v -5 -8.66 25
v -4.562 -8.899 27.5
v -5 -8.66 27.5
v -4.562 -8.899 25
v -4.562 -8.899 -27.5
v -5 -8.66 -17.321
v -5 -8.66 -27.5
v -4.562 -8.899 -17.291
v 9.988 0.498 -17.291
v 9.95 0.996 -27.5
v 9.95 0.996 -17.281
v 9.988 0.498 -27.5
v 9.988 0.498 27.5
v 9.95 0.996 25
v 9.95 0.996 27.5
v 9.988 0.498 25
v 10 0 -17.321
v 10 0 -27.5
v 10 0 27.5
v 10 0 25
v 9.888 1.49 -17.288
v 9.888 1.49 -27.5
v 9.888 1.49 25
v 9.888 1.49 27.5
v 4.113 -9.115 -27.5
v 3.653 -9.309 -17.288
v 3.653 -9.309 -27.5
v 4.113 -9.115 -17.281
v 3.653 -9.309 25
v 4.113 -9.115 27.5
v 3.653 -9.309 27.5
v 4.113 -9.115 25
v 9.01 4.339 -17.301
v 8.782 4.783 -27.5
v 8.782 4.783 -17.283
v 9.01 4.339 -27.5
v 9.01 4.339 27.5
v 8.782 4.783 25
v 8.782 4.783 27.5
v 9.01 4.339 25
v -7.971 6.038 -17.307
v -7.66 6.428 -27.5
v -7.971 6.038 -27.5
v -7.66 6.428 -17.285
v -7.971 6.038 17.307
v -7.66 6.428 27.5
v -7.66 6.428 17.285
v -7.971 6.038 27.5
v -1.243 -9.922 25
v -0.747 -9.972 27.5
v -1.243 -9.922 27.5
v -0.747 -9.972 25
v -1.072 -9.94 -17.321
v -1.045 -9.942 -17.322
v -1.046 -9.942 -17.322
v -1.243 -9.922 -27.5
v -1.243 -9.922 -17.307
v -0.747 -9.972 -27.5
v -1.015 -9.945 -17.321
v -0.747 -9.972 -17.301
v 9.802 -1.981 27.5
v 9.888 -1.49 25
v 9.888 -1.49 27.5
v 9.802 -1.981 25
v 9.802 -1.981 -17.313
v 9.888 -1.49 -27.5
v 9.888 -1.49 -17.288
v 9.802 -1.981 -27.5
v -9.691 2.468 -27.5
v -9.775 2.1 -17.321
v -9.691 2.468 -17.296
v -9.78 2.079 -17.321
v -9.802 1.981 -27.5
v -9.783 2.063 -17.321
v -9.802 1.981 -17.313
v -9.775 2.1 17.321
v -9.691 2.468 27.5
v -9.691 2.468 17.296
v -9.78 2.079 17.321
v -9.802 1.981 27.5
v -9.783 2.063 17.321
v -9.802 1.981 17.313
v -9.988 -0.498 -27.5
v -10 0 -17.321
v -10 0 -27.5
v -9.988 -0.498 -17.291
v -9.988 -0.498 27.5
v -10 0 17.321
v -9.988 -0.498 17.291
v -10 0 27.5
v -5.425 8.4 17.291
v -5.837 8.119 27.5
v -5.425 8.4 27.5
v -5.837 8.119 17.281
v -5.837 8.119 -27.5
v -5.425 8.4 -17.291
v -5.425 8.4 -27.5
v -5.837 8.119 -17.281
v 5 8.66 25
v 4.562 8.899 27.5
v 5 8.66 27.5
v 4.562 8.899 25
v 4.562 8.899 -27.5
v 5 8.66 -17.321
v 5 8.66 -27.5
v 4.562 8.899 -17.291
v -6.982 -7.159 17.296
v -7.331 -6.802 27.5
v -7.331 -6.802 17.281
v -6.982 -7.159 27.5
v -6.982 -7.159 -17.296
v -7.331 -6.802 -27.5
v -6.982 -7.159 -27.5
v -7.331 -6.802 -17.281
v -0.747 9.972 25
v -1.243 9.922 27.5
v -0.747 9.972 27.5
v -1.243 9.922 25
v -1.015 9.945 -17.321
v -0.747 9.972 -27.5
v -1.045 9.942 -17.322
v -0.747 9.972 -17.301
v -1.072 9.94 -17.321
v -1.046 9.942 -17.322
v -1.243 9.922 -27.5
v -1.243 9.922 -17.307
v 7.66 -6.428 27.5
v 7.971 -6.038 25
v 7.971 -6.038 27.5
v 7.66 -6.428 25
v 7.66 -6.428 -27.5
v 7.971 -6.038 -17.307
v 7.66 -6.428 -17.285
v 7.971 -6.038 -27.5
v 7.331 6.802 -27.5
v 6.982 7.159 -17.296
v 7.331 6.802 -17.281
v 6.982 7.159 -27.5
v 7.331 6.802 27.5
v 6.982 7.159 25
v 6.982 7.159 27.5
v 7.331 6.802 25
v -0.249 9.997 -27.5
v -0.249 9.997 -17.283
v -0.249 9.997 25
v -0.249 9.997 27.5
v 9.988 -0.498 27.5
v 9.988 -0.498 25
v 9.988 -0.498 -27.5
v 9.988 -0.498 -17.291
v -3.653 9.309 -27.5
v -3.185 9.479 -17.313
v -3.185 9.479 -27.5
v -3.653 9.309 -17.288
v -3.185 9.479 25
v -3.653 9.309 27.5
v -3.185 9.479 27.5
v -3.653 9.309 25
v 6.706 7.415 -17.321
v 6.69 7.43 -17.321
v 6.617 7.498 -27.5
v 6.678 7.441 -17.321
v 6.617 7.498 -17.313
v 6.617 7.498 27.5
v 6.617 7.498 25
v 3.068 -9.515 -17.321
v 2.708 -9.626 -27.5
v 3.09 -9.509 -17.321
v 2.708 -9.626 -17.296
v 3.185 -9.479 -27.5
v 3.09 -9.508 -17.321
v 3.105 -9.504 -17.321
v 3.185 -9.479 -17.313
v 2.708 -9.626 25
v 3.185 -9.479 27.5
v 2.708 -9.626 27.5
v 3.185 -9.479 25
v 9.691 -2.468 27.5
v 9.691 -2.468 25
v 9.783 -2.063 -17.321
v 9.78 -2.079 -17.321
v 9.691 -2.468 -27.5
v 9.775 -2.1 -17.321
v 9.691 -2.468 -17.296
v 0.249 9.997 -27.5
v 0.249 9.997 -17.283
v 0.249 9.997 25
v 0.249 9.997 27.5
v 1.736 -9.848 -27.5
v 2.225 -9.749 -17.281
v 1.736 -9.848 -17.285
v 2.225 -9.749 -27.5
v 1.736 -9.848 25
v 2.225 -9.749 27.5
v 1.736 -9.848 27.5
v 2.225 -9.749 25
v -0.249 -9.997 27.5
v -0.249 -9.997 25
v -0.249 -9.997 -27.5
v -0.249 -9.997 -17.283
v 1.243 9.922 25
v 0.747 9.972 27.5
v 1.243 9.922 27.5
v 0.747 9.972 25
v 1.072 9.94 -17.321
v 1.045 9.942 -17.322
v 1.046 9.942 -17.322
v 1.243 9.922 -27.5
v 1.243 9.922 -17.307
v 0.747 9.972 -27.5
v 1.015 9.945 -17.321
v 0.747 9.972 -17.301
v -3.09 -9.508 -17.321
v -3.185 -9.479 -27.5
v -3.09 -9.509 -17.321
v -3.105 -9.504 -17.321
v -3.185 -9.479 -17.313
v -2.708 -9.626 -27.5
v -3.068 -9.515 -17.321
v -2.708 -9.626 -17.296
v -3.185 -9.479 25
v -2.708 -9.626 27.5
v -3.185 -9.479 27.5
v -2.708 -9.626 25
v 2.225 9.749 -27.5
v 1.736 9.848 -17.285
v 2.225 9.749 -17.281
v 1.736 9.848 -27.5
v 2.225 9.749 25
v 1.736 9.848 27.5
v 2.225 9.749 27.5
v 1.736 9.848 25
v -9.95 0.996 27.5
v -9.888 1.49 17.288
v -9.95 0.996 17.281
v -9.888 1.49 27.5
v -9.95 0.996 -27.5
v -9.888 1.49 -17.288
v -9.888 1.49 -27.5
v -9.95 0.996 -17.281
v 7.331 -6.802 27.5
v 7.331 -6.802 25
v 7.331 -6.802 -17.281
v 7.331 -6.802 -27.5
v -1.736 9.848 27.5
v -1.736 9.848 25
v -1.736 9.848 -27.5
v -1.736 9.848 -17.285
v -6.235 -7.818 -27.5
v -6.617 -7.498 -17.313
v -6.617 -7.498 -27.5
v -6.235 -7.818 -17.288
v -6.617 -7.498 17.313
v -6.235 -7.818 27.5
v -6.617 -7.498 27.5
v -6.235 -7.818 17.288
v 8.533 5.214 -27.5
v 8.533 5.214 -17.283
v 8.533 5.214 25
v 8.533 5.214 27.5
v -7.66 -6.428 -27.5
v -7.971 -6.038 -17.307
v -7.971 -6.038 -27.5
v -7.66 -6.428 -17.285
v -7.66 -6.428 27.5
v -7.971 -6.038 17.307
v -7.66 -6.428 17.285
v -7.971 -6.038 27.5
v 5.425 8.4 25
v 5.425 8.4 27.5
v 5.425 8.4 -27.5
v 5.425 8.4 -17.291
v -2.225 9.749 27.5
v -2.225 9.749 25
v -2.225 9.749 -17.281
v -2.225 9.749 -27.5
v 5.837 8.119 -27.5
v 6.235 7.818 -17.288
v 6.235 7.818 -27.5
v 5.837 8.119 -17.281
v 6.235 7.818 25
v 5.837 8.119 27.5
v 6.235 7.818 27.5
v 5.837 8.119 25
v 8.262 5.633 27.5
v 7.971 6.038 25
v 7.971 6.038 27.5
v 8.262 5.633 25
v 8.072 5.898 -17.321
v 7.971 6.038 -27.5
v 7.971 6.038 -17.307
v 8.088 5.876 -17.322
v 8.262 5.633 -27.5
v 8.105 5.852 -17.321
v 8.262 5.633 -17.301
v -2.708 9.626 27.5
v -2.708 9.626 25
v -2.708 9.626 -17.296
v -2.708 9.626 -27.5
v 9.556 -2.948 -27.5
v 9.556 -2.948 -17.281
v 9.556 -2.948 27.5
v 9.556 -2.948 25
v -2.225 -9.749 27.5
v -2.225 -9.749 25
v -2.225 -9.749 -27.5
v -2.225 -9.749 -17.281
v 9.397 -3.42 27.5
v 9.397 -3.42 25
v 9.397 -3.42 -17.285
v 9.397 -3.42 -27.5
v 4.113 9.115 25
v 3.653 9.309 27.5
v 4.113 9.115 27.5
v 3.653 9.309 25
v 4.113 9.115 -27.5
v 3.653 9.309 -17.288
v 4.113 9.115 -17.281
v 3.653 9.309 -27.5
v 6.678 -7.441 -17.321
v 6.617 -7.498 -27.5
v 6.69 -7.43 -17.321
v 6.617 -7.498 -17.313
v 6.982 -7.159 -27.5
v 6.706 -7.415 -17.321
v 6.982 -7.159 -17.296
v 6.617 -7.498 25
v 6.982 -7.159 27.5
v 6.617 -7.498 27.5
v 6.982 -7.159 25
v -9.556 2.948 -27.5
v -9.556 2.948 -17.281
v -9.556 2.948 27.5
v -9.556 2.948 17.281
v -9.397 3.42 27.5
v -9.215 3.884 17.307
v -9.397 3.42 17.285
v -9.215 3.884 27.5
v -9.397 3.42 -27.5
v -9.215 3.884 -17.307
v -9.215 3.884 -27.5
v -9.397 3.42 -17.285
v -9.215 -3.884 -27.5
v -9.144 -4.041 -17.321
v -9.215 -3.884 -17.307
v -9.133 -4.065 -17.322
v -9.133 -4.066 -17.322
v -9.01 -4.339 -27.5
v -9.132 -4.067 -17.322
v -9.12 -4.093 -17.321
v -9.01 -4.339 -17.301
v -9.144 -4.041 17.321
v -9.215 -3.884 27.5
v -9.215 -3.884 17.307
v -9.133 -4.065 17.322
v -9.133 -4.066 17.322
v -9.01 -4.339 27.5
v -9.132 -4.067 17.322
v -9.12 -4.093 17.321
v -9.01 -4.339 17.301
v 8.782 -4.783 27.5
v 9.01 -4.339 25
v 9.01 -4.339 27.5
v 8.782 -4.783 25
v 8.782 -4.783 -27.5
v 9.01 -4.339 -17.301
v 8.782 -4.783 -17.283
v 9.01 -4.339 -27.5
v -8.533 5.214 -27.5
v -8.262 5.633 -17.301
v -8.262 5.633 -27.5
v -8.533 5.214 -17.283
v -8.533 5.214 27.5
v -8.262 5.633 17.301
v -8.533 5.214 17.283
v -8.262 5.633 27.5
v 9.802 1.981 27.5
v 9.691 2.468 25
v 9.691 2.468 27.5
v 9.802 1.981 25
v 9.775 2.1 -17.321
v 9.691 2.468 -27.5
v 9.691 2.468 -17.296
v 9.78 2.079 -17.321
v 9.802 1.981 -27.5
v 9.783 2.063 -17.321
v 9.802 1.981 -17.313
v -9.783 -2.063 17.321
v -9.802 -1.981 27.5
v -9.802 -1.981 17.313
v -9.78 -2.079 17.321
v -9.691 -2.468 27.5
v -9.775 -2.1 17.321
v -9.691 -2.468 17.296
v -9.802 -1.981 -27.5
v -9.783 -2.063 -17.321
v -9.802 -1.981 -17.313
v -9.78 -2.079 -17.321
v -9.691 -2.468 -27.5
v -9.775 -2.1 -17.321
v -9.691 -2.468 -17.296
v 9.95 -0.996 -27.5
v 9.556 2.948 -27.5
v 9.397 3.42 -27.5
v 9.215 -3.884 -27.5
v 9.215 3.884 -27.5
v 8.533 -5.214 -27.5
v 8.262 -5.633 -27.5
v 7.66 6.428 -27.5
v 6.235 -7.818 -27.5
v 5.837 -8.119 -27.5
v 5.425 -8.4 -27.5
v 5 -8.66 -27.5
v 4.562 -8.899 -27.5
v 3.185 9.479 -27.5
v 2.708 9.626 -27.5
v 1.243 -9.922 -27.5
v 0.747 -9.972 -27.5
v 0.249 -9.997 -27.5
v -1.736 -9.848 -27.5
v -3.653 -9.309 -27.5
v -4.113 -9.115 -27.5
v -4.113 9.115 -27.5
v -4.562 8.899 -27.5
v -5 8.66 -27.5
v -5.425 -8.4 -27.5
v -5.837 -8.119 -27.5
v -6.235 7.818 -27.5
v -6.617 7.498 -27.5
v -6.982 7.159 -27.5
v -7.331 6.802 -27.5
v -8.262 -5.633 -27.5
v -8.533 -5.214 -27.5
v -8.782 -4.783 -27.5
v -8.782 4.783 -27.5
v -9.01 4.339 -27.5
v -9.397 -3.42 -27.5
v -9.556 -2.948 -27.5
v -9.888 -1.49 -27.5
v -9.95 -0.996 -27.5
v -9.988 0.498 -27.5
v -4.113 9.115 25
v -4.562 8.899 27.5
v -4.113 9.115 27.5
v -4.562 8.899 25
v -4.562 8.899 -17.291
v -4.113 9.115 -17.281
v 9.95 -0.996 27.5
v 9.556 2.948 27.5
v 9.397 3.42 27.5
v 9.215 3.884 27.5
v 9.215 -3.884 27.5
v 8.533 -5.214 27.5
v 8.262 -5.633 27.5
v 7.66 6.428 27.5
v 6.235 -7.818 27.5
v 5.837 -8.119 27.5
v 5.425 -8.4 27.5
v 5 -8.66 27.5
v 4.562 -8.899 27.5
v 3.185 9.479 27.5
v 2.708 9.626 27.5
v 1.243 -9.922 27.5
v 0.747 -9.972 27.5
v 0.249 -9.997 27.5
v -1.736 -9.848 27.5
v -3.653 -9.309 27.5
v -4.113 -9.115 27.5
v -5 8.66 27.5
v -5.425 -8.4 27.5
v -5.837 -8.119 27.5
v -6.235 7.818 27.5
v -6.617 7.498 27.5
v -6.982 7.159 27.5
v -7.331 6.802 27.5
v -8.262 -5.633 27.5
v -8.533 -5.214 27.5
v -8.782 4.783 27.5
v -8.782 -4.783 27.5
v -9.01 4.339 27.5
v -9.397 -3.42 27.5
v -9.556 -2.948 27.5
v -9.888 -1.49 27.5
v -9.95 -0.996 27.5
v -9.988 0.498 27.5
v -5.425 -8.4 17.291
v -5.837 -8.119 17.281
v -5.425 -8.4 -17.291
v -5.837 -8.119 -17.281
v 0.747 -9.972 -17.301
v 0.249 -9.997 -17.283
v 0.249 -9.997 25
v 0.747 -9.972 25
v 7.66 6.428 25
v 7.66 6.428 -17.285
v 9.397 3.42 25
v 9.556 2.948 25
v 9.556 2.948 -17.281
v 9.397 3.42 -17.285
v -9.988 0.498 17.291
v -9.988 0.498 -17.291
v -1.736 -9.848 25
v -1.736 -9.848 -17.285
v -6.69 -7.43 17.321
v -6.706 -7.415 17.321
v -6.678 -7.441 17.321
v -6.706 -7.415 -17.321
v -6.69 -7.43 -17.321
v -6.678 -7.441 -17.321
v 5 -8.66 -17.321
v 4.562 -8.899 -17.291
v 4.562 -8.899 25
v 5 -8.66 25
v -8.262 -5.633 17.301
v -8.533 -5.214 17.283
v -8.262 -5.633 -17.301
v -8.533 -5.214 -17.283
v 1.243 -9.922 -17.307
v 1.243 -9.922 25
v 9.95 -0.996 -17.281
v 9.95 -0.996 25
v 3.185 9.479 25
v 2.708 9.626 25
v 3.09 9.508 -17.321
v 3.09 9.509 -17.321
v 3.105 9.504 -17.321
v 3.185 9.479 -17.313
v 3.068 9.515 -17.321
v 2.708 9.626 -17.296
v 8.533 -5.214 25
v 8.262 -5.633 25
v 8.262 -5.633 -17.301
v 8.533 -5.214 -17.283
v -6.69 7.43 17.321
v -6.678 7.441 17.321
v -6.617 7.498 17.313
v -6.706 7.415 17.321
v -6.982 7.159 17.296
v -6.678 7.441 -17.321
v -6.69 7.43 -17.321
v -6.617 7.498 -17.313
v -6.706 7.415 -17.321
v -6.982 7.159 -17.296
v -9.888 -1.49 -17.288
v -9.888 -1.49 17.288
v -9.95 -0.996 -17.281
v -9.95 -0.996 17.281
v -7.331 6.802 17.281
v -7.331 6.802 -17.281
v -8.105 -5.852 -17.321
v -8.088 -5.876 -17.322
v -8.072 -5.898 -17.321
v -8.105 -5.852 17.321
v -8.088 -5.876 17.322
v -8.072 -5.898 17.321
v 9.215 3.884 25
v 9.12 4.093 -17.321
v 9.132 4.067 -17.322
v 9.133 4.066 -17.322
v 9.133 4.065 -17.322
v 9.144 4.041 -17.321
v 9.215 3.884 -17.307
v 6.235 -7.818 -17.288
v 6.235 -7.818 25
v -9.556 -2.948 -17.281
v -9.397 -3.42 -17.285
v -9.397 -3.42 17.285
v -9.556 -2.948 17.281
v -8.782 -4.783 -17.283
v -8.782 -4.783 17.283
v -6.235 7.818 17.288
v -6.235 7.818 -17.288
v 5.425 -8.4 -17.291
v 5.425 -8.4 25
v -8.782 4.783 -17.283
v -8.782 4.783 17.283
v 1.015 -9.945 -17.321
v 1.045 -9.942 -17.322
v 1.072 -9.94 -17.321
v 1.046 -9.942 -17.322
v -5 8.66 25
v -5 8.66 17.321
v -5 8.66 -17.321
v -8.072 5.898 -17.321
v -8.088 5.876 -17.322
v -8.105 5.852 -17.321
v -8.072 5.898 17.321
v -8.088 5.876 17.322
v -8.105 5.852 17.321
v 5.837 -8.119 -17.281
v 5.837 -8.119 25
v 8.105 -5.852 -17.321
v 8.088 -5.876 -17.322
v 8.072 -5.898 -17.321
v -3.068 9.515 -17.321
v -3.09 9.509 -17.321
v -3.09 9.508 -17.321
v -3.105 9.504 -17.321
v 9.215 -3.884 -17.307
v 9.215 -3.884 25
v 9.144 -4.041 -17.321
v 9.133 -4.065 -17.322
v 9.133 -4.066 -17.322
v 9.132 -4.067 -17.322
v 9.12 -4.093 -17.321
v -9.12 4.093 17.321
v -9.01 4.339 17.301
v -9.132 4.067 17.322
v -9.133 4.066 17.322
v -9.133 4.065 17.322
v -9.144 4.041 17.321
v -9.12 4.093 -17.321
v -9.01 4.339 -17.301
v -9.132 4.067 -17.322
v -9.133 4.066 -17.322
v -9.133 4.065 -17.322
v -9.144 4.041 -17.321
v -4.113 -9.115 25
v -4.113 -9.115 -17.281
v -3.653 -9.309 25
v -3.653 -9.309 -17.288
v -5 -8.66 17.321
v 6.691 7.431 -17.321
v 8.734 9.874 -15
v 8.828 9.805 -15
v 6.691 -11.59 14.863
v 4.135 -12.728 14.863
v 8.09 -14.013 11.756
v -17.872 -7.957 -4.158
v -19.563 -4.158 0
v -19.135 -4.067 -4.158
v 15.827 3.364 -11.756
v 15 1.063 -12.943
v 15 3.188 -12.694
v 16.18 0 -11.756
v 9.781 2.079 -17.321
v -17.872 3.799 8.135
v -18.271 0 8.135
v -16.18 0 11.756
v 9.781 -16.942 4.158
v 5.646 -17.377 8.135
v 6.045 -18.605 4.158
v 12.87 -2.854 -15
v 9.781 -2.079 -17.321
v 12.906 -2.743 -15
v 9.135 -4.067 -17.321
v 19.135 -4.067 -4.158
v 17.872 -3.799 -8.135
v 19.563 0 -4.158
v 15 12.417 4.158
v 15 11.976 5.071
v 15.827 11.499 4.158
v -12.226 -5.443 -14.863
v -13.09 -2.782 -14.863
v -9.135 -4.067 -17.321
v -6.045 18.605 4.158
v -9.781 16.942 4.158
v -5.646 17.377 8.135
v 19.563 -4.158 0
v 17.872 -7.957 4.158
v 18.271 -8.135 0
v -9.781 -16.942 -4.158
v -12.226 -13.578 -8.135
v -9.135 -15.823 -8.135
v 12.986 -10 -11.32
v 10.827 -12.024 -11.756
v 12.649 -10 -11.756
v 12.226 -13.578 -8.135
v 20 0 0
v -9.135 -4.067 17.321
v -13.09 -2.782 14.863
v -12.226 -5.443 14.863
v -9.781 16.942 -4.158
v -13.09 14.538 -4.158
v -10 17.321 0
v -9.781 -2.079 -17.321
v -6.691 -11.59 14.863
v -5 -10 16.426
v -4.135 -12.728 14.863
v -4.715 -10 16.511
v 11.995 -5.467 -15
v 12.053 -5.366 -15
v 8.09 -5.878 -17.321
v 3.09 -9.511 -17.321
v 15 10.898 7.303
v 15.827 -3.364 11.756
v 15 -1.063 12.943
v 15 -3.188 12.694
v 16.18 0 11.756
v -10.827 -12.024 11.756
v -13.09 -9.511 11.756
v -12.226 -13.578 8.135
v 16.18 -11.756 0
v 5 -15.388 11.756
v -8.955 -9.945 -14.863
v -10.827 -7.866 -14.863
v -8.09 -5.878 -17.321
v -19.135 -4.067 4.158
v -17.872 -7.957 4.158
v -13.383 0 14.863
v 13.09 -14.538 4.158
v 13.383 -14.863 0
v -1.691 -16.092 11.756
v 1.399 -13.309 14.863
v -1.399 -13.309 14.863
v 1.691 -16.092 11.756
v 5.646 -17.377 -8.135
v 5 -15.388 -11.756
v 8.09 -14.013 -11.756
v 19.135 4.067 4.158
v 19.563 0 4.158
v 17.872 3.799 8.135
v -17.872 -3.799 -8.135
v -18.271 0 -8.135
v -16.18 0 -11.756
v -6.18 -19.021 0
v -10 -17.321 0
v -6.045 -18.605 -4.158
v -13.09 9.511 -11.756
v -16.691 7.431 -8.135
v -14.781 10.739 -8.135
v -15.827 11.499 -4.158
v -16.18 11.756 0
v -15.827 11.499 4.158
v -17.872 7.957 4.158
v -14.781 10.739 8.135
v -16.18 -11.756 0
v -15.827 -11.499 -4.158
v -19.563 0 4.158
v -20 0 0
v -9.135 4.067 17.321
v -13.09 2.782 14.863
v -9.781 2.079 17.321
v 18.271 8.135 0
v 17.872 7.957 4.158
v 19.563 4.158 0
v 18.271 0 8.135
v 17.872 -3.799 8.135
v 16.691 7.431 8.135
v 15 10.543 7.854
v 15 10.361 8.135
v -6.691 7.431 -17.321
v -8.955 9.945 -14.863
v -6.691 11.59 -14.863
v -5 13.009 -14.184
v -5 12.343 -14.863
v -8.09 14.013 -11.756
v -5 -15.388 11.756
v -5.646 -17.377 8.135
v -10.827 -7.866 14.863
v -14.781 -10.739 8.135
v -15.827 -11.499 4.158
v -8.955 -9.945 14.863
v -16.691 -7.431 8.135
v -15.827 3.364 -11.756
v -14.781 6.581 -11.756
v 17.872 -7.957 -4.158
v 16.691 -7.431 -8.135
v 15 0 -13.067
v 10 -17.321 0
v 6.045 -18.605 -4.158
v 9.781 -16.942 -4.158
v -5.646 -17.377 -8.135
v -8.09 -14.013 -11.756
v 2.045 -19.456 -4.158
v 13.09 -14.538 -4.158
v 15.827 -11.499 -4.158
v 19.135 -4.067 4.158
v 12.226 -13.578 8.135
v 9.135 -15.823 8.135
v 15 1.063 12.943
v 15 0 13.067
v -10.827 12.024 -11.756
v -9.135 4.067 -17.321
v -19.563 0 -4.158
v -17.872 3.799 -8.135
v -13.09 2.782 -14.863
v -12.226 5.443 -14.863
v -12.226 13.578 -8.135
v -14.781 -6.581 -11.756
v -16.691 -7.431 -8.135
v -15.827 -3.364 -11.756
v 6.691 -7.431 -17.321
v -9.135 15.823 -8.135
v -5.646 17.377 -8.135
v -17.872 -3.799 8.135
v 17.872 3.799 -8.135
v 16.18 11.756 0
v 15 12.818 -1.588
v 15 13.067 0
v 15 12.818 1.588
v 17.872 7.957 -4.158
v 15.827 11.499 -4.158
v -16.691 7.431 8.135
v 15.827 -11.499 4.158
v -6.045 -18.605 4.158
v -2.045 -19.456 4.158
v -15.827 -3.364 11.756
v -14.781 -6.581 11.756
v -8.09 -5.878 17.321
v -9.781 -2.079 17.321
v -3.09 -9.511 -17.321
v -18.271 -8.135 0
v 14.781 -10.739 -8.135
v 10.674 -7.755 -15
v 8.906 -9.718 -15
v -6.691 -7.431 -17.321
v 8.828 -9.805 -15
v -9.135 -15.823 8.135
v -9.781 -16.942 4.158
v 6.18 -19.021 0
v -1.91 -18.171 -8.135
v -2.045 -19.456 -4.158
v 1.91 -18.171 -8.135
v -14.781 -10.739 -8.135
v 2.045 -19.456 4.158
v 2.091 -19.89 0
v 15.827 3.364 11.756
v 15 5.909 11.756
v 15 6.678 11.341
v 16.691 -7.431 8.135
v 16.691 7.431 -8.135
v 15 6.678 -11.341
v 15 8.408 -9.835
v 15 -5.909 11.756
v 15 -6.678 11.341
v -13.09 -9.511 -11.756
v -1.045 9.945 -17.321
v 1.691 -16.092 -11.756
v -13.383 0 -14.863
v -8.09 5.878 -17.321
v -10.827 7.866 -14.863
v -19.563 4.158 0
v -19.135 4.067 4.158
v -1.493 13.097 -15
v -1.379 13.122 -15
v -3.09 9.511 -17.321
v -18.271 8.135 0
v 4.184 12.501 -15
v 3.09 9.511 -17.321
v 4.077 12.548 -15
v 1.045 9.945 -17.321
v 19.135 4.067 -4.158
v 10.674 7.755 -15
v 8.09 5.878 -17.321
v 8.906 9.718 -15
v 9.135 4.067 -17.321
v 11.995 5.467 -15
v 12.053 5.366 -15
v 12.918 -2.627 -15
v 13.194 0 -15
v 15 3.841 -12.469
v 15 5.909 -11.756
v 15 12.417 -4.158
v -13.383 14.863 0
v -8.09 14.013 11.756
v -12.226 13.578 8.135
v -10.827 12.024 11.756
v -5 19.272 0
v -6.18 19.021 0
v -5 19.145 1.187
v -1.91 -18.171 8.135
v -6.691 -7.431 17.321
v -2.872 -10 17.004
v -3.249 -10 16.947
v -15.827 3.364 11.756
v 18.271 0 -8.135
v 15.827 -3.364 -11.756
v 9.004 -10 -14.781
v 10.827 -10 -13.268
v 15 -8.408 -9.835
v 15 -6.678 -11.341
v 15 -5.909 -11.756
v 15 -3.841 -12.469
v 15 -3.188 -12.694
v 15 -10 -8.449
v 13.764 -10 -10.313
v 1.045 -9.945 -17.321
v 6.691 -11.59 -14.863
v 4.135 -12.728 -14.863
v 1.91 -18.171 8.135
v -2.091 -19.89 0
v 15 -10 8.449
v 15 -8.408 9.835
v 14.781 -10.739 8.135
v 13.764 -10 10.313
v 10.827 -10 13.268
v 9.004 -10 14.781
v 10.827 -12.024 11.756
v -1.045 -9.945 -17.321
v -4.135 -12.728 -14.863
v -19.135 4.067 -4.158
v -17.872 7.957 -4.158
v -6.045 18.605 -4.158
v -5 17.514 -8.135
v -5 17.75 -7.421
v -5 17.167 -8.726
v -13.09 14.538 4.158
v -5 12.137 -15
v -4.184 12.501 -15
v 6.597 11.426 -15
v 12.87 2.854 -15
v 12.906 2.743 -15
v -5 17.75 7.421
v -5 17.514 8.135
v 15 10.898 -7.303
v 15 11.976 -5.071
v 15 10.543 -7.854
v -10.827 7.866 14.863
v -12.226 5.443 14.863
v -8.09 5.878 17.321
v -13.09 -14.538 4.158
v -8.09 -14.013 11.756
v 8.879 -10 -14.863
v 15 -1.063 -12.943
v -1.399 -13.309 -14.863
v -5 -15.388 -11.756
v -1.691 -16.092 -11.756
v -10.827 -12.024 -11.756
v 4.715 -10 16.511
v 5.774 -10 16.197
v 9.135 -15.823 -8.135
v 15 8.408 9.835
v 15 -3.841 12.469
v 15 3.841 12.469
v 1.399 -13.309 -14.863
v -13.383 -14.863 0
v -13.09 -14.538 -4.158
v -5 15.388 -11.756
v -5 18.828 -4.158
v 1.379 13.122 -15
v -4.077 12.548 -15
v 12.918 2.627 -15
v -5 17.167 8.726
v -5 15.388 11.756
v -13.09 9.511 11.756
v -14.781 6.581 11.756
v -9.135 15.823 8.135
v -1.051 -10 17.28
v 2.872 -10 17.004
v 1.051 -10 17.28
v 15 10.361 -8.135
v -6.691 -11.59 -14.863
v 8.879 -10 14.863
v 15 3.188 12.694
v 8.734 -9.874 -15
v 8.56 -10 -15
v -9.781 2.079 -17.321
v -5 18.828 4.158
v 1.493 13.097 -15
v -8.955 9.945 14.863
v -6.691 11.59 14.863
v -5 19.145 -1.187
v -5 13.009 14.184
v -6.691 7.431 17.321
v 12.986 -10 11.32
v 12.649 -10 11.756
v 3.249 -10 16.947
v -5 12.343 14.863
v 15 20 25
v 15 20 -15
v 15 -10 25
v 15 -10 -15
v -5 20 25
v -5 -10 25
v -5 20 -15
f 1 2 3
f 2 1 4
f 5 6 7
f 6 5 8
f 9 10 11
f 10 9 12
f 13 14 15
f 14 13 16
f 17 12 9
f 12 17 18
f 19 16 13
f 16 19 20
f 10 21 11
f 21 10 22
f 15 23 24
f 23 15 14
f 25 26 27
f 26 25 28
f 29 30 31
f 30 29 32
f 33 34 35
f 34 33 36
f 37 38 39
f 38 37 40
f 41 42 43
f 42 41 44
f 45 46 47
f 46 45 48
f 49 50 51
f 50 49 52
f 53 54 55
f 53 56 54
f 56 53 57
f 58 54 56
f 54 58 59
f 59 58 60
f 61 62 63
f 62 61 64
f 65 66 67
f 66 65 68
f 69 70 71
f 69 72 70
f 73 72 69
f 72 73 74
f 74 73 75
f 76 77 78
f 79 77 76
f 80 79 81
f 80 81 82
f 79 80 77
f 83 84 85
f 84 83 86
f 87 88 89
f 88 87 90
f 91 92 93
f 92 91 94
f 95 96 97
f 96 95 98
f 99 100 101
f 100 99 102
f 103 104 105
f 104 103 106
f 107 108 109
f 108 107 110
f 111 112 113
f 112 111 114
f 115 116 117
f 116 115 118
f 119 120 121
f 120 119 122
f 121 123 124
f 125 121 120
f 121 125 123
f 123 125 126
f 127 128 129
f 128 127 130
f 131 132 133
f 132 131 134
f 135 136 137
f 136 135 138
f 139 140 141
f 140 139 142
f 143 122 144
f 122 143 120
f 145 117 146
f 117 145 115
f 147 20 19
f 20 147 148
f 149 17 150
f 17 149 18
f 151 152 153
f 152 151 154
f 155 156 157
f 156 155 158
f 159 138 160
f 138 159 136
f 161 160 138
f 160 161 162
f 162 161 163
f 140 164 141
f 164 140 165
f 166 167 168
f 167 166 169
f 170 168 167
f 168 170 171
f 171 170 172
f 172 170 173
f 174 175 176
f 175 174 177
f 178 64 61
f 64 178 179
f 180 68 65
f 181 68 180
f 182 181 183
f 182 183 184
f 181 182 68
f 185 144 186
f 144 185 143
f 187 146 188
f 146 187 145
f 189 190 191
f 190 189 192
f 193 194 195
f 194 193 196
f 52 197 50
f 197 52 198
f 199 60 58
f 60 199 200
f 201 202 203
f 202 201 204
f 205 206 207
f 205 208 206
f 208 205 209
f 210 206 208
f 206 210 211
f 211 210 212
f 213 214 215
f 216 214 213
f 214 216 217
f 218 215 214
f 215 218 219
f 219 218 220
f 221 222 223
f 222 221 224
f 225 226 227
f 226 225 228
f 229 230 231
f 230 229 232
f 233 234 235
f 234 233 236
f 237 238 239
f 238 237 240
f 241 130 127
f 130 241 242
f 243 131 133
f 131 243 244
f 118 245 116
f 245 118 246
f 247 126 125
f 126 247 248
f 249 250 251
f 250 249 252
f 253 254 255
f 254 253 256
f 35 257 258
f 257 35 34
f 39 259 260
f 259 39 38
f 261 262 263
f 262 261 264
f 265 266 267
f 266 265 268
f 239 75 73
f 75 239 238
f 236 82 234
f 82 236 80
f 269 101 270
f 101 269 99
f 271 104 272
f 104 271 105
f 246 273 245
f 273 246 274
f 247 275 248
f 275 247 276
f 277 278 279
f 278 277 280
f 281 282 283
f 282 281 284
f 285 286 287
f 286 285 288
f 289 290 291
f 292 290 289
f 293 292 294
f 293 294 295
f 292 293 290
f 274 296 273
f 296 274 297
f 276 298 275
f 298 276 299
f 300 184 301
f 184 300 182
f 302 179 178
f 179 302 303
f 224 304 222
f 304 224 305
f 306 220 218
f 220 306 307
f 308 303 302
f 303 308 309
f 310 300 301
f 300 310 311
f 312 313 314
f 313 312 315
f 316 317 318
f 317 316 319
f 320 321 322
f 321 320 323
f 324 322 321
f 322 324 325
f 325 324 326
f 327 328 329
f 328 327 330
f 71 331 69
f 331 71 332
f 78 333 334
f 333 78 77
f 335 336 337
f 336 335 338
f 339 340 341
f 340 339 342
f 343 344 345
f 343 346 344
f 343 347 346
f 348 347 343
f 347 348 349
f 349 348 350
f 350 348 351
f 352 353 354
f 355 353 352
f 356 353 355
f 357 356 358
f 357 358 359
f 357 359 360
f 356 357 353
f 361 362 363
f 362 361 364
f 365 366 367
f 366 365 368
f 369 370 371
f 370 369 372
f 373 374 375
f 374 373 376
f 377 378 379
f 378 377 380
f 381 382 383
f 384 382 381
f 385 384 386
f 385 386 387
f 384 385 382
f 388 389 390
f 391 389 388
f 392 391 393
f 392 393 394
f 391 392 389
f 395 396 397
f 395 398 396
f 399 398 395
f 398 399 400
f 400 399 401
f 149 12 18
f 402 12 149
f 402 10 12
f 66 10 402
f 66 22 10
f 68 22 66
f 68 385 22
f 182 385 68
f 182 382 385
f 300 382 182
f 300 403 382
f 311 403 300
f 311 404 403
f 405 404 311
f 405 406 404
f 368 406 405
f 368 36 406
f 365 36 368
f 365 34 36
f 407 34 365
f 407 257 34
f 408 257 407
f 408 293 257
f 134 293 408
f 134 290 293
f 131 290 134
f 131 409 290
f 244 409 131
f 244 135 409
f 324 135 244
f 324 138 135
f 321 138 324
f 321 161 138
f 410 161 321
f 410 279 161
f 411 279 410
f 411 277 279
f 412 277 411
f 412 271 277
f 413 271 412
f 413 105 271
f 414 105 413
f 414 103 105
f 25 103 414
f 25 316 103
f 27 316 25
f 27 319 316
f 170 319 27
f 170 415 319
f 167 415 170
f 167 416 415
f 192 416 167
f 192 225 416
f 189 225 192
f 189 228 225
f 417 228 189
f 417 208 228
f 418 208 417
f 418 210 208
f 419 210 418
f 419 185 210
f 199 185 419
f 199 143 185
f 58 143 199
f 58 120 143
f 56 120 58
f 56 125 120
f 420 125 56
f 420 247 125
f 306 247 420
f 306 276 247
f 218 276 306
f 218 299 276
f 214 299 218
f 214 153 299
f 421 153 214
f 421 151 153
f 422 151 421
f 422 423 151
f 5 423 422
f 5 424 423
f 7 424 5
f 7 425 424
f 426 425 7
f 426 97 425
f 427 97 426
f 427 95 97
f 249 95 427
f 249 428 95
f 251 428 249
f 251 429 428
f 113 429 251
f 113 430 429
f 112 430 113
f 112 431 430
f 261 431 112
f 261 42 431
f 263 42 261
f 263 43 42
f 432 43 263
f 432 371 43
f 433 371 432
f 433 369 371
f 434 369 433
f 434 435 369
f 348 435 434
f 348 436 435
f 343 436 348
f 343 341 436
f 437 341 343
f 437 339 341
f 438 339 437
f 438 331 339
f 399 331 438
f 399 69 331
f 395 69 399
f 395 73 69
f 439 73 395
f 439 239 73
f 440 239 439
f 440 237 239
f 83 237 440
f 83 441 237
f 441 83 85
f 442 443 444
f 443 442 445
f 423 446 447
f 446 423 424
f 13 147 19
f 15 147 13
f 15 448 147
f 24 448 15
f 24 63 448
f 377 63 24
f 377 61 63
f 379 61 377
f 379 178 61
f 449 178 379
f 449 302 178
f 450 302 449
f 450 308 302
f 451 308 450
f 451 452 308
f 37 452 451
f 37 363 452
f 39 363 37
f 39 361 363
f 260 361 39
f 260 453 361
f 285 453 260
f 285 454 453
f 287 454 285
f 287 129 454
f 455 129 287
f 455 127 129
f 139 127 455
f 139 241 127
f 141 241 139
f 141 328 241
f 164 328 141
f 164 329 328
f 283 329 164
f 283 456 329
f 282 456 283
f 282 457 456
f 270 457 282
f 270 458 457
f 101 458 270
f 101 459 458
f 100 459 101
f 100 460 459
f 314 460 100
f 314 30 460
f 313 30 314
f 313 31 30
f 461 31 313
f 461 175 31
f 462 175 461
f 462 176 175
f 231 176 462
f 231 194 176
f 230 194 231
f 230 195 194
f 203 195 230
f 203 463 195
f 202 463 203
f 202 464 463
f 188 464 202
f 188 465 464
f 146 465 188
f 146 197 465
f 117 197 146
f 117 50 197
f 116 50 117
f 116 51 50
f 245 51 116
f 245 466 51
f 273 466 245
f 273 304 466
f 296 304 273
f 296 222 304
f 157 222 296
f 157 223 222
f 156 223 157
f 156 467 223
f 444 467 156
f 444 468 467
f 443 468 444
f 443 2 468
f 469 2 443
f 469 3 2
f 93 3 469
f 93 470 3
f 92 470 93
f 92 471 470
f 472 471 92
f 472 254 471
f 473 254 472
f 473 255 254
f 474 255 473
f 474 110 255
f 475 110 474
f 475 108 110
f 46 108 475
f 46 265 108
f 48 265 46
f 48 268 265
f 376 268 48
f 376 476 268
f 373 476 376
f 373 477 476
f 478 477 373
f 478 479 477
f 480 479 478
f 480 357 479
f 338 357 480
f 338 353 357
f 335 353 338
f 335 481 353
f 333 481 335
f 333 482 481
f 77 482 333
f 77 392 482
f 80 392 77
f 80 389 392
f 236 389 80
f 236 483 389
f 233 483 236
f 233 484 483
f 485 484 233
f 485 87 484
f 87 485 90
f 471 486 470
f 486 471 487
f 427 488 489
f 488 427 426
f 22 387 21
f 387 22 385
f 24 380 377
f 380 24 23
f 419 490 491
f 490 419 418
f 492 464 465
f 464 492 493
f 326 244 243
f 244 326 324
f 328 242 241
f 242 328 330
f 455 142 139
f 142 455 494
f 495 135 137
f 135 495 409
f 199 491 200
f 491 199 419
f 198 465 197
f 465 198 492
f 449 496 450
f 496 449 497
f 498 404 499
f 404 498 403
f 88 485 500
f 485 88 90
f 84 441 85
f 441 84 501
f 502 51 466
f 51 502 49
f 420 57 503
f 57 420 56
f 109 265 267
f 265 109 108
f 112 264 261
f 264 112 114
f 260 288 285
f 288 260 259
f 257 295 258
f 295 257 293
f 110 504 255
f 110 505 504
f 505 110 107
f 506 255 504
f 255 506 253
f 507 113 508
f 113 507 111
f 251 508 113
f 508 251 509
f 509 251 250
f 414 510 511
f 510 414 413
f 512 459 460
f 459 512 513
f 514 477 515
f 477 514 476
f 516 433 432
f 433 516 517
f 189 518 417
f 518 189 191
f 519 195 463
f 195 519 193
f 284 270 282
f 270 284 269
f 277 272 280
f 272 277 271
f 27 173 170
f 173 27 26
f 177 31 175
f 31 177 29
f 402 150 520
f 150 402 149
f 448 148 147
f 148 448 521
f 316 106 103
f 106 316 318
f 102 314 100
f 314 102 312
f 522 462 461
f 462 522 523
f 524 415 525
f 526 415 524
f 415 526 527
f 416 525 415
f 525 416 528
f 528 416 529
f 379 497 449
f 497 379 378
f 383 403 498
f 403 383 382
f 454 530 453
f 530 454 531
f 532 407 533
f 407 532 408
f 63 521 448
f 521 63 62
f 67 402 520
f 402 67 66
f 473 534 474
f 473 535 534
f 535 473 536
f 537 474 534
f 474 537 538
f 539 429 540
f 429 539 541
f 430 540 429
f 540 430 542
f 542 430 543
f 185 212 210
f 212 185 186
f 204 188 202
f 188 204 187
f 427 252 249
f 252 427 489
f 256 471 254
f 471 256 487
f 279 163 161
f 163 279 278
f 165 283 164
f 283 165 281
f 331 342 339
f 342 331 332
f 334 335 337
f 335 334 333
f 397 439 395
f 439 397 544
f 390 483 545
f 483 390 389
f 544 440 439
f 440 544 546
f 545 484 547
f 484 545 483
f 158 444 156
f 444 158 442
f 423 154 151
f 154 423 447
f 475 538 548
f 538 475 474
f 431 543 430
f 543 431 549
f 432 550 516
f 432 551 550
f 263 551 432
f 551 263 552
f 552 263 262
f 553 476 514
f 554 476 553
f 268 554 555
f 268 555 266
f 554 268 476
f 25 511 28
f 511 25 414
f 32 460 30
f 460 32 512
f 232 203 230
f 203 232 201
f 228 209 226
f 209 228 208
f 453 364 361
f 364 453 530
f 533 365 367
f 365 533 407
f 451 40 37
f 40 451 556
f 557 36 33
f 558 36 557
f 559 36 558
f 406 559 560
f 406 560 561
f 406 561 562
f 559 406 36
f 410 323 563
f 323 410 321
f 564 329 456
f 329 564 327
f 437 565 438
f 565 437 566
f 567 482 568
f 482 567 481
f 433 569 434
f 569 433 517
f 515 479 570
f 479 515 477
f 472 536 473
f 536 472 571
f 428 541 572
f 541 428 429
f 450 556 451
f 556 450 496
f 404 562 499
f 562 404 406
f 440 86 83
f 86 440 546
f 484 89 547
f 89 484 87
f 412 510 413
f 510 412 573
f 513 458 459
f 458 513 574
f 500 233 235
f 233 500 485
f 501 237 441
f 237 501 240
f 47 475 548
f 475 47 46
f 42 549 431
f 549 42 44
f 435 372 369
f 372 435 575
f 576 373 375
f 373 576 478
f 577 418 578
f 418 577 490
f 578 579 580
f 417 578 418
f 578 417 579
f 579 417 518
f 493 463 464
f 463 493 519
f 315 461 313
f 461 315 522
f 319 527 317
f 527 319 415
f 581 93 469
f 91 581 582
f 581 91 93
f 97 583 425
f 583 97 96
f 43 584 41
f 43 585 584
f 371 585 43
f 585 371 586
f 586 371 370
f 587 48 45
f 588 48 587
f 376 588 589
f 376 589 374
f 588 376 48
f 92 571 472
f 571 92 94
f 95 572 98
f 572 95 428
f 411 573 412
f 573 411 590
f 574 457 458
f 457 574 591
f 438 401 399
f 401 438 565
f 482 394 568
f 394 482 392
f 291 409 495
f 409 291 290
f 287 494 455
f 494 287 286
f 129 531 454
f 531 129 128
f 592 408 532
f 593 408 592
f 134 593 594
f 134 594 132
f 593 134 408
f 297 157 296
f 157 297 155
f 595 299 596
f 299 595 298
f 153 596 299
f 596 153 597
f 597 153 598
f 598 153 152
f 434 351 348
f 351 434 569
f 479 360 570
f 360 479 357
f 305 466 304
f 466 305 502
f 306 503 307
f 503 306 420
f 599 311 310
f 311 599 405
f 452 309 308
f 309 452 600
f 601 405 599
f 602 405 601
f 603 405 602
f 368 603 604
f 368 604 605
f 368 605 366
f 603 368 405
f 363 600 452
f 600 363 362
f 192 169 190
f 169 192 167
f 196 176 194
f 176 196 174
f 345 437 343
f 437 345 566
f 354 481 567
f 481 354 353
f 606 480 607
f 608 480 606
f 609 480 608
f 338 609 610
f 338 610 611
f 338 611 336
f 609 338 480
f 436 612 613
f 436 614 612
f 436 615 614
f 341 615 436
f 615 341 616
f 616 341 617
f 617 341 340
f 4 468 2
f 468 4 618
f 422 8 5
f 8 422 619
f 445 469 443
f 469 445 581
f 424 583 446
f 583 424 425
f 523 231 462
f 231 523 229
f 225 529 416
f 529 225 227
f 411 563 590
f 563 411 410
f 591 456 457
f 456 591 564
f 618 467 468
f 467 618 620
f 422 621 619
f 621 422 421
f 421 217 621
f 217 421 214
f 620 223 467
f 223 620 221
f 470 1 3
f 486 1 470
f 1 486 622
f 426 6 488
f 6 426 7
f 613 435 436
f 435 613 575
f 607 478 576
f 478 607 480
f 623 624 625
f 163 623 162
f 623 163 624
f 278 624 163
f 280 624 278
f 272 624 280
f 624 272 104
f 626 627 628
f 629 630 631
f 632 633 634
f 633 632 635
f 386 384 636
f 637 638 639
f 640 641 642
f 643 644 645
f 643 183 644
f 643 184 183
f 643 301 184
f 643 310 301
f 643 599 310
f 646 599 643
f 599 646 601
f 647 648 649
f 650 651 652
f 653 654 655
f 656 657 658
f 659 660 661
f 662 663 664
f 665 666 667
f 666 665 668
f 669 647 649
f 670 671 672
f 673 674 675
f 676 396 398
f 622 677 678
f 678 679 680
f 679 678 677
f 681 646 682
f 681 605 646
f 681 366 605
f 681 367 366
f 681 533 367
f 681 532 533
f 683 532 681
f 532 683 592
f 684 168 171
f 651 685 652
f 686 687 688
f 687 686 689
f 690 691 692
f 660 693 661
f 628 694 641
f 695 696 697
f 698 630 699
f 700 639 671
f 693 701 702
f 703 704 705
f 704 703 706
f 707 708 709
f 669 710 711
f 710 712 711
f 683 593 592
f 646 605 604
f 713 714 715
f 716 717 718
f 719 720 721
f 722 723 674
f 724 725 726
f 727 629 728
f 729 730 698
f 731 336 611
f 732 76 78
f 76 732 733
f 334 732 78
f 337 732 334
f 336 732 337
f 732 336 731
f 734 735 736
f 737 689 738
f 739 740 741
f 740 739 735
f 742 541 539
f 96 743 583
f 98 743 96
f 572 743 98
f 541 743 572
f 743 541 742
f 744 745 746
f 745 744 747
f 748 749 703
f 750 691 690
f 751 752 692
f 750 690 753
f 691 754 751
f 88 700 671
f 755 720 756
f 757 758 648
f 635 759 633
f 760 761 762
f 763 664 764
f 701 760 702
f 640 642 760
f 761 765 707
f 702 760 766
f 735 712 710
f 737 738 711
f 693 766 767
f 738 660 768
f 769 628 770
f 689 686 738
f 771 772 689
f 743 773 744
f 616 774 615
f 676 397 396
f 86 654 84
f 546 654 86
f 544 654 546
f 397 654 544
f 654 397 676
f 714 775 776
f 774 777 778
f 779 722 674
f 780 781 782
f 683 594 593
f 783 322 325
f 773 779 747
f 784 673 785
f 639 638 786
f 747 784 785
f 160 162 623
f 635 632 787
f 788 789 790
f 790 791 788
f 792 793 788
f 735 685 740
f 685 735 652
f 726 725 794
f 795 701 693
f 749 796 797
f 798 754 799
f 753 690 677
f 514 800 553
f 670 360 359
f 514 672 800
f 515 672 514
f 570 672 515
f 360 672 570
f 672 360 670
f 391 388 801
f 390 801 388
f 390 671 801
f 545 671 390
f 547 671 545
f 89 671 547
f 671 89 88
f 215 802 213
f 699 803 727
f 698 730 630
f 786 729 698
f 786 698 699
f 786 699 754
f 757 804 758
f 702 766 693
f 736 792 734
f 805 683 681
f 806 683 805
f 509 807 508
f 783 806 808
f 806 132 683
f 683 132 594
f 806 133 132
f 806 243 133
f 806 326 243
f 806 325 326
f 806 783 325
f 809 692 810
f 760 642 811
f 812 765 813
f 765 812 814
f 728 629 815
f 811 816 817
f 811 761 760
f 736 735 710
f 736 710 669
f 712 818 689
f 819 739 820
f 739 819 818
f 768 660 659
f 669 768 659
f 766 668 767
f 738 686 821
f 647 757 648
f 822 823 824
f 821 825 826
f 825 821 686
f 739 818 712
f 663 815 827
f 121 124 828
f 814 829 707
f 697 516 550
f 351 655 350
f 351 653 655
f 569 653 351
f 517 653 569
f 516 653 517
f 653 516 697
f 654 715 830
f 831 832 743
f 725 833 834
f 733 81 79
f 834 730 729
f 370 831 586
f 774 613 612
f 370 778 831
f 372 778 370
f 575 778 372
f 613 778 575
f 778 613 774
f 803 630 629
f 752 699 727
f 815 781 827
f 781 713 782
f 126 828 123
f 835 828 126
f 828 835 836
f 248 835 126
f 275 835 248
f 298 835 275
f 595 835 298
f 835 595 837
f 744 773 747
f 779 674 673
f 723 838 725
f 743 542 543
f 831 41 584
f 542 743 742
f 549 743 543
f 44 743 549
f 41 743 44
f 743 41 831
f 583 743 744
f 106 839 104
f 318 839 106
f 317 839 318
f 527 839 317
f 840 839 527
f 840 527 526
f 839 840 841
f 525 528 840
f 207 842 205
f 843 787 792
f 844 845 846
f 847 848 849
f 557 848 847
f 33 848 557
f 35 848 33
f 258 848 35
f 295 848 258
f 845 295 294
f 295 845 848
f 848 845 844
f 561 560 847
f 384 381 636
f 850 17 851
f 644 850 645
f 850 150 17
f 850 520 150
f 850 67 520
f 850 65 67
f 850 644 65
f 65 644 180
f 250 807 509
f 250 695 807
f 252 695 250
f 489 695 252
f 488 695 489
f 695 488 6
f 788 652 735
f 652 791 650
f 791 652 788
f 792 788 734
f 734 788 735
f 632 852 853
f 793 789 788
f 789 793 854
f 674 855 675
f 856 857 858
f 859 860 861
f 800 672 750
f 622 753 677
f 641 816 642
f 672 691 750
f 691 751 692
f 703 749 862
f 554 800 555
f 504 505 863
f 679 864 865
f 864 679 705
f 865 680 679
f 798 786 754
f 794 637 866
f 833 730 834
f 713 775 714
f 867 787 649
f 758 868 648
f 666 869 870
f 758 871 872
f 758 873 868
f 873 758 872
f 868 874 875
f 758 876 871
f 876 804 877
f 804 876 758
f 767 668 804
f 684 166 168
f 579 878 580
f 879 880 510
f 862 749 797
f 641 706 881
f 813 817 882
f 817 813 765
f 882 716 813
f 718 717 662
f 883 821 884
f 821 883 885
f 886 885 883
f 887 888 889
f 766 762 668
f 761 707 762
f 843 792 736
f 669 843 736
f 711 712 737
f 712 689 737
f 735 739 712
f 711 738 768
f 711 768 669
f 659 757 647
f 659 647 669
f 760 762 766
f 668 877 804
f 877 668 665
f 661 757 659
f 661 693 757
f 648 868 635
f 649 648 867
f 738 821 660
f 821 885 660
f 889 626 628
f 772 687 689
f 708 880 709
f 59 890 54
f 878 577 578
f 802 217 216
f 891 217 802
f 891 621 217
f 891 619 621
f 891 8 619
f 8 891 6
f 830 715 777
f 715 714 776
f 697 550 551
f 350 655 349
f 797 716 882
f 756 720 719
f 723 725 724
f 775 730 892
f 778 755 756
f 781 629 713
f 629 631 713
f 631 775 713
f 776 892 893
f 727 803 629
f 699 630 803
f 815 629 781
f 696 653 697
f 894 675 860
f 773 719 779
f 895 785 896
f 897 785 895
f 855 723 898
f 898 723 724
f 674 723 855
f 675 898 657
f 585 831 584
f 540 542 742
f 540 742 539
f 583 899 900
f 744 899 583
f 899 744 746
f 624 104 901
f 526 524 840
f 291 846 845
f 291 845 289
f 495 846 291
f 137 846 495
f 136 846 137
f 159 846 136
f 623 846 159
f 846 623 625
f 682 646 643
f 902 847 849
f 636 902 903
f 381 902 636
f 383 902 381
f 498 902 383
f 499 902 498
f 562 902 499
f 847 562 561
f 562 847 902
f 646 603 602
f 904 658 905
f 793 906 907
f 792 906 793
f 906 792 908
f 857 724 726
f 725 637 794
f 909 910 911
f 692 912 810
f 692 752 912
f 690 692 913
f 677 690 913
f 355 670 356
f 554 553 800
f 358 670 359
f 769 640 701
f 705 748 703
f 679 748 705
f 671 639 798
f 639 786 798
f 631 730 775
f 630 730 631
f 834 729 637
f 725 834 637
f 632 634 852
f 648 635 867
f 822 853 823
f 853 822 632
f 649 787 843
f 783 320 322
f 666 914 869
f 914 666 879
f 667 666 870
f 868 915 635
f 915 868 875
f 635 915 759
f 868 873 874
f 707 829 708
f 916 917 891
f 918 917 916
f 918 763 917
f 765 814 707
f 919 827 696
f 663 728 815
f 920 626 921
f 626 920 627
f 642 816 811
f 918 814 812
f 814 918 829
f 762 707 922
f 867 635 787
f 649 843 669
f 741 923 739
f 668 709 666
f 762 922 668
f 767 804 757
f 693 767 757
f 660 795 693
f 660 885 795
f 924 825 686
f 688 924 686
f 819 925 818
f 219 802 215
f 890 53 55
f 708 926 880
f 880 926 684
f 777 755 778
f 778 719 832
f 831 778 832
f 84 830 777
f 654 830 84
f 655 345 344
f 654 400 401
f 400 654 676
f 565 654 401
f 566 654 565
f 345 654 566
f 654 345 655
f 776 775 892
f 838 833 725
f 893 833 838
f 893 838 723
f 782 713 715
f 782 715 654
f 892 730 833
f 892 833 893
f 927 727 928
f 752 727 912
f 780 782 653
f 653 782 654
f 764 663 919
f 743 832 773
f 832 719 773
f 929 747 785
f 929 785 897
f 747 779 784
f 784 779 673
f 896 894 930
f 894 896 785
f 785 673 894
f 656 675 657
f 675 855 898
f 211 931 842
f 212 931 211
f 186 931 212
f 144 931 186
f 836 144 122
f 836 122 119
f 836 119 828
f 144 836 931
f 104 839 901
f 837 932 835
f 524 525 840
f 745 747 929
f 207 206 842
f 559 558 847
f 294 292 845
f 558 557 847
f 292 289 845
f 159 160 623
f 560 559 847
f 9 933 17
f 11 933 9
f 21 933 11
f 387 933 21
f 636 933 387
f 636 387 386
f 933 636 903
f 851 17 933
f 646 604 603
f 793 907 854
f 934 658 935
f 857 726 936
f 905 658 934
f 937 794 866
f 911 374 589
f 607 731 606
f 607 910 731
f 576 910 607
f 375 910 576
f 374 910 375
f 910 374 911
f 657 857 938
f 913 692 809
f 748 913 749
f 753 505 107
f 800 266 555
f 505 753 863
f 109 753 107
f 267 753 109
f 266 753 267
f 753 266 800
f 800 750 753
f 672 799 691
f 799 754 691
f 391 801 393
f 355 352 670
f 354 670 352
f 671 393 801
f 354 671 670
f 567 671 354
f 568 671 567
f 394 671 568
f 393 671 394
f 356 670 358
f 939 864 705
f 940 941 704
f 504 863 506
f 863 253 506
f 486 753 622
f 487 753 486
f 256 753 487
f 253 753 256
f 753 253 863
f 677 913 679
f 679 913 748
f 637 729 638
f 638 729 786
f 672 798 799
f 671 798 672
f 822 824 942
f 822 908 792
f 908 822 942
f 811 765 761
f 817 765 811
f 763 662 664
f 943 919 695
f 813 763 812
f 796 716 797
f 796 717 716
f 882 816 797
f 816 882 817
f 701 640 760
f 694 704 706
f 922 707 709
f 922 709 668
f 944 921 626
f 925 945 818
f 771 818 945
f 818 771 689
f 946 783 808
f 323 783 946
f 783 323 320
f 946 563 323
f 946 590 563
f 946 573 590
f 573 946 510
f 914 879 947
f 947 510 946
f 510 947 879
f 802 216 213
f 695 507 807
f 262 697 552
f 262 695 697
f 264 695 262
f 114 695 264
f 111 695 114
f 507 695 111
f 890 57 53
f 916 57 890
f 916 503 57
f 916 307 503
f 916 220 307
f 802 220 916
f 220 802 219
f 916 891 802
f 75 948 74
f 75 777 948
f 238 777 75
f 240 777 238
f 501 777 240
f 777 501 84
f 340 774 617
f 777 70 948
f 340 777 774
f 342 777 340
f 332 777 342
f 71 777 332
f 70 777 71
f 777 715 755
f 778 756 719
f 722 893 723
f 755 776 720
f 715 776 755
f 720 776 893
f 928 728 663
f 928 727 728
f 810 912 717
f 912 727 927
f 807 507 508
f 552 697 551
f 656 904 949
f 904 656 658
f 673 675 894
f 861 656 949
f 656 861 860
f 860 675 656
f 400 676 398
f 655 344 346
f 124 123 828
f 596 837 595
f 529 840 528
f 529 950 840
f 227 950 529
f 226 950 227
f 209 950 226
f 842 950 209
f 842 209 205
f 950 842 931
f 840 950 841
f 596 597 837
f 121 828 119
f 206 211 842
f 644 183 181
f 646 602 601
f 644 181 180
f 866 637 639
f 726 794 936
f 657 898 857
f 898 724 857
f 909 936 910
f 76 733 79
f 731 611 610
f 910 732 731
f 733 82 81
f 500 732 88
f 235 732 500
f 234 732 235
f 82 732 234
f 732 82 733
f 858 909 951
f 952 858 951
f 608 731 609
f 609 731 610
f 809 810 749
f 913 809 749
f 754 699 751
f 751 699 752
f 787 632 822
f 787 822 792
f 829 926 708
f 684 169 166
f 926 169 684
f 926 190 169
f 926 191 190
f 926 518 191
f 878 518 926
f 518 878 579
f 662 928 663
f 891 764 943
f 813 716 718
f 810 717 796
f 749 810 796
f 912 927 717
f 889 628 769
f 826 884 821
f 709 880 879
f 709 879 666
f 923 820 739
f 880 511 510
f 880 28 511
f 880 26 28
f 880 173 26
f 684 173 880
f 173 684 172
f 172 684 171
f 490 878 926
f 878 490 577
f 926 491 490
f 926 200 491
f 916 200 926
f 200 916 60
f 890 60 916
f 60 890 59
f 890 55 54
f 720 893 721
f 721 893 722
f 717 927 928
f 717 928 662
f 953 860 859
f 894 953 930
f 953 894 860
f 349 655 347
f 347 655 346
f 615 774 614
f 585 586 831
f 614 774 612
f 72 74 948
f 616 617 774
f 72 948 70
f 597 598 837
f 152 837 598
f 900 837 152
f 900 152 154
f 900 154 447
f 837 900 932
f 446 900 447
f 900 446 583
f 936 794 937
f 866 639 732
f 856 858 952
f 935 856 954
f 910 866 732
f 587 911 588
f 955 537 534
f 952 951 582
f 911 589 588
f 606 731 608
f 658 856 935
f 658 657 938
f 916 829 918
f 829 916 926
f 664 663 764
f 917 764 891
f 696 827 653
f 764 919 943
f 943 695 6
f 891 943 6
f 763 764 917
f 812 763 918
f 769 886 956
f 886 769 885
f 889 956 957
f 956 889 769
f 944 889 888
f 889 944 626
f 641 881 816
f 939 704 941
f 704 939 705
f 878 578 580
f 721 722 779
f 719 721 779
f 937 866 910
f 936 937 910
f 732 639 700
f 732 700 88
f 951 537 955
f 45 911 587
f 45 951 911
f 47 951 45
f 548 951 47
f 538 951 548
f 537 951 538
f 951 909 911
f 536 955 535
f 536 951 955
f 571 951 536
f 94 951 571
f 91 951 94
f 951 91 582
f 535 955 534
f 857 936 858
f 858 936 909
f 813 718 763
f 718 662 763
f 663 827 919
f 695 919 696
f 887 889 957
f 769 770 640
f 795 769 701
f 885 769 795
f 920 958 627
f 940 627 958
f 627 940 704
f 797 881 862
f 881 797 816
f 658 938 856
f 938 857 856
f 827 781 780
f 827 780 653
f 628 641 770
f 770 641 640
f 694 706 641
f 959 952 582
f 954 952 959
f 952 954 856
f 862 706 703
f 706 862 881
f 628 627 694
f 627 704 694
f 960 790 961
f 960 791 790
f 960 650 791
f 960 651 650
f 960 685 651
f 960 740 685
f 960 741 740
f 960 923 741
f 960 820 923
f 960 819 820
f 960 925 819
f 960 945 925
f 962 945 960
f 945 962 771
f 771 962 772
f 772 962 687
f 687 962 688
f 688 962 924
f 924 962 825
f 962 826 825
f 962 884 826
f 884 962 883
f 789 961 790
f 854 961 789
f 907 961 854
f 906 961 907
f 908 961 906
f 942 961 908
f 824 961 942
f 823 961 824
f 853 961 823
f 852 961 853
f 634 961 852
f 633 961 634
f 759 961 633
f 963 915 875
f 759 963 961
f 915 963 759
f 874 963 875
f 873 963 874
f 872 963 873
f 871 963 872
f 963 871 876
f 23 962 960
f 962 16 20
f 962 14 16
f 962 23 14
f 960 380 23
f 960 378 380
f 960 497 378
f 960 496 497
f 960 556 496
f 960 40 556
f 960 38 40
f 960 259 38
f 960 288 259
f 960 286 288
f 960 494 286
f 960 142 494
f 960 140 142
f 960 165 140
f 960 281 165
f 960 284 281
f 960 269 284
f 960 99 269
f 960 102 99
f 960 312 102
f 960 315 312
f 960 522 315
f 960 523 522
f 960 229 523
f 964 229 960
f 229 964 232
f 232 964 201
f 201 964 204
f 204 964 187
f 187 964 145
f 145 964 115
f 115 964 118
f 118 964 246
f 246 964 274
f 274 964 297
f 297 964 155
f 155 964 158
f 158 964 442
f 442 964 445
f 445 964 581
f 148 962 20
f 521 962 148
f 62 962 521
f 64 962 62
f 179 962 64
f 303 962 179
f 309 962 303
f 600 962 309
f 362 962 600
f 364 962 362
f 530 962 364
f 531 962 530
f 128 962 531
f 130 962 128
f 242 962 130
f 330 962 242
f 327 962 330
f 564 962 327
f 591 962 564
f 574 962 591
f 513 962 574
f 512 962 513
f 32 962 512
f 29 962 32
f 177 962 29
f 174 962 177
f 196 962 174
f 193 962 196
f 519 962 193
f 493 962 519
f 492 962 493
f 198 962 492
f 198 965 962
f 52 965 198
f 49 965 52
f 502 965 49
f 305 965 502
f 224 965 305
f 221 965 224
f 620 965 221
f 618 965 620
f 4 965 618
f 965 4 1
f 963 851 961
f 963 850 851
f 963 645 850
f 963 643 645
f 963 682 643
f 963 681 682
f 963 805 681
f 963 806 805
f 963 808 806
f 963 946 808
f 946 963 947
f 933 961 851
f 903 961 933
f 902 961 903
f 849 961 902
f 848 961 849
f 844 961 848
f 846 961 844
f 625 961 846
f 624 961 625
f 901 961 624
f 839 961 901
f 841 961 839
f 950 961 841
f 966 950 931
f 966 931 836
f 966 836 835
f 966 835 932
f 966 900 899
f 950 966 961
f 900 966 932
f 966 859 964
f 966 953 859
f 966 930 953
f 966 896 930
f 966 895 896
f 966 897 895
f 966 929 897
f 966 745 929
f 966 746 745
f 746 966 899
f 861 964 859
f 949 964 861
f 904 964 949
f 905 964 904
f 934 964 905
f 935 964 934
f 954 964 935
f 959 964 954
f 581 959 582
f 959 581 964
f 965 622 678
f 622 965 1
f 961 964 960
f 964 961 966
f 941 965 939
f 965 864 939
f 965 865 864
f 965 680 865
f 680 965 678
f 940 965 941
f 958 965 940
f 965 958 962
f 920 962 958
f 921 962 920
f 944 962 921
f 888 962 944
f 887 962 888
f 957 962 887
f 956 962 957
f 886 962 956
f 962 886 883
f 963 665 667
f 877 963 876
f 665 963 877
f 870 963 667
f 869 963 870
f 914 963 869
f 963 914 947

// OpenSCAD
color([0,0,1]){
union(){
cylinder(h=55,center=true,$fa=0.5,$fs=0.5,r=10);
#sphere(r=20,center=true);
translate([5,5,5]){
#cube(size=[20,30,40],center=true);
}
}
}
